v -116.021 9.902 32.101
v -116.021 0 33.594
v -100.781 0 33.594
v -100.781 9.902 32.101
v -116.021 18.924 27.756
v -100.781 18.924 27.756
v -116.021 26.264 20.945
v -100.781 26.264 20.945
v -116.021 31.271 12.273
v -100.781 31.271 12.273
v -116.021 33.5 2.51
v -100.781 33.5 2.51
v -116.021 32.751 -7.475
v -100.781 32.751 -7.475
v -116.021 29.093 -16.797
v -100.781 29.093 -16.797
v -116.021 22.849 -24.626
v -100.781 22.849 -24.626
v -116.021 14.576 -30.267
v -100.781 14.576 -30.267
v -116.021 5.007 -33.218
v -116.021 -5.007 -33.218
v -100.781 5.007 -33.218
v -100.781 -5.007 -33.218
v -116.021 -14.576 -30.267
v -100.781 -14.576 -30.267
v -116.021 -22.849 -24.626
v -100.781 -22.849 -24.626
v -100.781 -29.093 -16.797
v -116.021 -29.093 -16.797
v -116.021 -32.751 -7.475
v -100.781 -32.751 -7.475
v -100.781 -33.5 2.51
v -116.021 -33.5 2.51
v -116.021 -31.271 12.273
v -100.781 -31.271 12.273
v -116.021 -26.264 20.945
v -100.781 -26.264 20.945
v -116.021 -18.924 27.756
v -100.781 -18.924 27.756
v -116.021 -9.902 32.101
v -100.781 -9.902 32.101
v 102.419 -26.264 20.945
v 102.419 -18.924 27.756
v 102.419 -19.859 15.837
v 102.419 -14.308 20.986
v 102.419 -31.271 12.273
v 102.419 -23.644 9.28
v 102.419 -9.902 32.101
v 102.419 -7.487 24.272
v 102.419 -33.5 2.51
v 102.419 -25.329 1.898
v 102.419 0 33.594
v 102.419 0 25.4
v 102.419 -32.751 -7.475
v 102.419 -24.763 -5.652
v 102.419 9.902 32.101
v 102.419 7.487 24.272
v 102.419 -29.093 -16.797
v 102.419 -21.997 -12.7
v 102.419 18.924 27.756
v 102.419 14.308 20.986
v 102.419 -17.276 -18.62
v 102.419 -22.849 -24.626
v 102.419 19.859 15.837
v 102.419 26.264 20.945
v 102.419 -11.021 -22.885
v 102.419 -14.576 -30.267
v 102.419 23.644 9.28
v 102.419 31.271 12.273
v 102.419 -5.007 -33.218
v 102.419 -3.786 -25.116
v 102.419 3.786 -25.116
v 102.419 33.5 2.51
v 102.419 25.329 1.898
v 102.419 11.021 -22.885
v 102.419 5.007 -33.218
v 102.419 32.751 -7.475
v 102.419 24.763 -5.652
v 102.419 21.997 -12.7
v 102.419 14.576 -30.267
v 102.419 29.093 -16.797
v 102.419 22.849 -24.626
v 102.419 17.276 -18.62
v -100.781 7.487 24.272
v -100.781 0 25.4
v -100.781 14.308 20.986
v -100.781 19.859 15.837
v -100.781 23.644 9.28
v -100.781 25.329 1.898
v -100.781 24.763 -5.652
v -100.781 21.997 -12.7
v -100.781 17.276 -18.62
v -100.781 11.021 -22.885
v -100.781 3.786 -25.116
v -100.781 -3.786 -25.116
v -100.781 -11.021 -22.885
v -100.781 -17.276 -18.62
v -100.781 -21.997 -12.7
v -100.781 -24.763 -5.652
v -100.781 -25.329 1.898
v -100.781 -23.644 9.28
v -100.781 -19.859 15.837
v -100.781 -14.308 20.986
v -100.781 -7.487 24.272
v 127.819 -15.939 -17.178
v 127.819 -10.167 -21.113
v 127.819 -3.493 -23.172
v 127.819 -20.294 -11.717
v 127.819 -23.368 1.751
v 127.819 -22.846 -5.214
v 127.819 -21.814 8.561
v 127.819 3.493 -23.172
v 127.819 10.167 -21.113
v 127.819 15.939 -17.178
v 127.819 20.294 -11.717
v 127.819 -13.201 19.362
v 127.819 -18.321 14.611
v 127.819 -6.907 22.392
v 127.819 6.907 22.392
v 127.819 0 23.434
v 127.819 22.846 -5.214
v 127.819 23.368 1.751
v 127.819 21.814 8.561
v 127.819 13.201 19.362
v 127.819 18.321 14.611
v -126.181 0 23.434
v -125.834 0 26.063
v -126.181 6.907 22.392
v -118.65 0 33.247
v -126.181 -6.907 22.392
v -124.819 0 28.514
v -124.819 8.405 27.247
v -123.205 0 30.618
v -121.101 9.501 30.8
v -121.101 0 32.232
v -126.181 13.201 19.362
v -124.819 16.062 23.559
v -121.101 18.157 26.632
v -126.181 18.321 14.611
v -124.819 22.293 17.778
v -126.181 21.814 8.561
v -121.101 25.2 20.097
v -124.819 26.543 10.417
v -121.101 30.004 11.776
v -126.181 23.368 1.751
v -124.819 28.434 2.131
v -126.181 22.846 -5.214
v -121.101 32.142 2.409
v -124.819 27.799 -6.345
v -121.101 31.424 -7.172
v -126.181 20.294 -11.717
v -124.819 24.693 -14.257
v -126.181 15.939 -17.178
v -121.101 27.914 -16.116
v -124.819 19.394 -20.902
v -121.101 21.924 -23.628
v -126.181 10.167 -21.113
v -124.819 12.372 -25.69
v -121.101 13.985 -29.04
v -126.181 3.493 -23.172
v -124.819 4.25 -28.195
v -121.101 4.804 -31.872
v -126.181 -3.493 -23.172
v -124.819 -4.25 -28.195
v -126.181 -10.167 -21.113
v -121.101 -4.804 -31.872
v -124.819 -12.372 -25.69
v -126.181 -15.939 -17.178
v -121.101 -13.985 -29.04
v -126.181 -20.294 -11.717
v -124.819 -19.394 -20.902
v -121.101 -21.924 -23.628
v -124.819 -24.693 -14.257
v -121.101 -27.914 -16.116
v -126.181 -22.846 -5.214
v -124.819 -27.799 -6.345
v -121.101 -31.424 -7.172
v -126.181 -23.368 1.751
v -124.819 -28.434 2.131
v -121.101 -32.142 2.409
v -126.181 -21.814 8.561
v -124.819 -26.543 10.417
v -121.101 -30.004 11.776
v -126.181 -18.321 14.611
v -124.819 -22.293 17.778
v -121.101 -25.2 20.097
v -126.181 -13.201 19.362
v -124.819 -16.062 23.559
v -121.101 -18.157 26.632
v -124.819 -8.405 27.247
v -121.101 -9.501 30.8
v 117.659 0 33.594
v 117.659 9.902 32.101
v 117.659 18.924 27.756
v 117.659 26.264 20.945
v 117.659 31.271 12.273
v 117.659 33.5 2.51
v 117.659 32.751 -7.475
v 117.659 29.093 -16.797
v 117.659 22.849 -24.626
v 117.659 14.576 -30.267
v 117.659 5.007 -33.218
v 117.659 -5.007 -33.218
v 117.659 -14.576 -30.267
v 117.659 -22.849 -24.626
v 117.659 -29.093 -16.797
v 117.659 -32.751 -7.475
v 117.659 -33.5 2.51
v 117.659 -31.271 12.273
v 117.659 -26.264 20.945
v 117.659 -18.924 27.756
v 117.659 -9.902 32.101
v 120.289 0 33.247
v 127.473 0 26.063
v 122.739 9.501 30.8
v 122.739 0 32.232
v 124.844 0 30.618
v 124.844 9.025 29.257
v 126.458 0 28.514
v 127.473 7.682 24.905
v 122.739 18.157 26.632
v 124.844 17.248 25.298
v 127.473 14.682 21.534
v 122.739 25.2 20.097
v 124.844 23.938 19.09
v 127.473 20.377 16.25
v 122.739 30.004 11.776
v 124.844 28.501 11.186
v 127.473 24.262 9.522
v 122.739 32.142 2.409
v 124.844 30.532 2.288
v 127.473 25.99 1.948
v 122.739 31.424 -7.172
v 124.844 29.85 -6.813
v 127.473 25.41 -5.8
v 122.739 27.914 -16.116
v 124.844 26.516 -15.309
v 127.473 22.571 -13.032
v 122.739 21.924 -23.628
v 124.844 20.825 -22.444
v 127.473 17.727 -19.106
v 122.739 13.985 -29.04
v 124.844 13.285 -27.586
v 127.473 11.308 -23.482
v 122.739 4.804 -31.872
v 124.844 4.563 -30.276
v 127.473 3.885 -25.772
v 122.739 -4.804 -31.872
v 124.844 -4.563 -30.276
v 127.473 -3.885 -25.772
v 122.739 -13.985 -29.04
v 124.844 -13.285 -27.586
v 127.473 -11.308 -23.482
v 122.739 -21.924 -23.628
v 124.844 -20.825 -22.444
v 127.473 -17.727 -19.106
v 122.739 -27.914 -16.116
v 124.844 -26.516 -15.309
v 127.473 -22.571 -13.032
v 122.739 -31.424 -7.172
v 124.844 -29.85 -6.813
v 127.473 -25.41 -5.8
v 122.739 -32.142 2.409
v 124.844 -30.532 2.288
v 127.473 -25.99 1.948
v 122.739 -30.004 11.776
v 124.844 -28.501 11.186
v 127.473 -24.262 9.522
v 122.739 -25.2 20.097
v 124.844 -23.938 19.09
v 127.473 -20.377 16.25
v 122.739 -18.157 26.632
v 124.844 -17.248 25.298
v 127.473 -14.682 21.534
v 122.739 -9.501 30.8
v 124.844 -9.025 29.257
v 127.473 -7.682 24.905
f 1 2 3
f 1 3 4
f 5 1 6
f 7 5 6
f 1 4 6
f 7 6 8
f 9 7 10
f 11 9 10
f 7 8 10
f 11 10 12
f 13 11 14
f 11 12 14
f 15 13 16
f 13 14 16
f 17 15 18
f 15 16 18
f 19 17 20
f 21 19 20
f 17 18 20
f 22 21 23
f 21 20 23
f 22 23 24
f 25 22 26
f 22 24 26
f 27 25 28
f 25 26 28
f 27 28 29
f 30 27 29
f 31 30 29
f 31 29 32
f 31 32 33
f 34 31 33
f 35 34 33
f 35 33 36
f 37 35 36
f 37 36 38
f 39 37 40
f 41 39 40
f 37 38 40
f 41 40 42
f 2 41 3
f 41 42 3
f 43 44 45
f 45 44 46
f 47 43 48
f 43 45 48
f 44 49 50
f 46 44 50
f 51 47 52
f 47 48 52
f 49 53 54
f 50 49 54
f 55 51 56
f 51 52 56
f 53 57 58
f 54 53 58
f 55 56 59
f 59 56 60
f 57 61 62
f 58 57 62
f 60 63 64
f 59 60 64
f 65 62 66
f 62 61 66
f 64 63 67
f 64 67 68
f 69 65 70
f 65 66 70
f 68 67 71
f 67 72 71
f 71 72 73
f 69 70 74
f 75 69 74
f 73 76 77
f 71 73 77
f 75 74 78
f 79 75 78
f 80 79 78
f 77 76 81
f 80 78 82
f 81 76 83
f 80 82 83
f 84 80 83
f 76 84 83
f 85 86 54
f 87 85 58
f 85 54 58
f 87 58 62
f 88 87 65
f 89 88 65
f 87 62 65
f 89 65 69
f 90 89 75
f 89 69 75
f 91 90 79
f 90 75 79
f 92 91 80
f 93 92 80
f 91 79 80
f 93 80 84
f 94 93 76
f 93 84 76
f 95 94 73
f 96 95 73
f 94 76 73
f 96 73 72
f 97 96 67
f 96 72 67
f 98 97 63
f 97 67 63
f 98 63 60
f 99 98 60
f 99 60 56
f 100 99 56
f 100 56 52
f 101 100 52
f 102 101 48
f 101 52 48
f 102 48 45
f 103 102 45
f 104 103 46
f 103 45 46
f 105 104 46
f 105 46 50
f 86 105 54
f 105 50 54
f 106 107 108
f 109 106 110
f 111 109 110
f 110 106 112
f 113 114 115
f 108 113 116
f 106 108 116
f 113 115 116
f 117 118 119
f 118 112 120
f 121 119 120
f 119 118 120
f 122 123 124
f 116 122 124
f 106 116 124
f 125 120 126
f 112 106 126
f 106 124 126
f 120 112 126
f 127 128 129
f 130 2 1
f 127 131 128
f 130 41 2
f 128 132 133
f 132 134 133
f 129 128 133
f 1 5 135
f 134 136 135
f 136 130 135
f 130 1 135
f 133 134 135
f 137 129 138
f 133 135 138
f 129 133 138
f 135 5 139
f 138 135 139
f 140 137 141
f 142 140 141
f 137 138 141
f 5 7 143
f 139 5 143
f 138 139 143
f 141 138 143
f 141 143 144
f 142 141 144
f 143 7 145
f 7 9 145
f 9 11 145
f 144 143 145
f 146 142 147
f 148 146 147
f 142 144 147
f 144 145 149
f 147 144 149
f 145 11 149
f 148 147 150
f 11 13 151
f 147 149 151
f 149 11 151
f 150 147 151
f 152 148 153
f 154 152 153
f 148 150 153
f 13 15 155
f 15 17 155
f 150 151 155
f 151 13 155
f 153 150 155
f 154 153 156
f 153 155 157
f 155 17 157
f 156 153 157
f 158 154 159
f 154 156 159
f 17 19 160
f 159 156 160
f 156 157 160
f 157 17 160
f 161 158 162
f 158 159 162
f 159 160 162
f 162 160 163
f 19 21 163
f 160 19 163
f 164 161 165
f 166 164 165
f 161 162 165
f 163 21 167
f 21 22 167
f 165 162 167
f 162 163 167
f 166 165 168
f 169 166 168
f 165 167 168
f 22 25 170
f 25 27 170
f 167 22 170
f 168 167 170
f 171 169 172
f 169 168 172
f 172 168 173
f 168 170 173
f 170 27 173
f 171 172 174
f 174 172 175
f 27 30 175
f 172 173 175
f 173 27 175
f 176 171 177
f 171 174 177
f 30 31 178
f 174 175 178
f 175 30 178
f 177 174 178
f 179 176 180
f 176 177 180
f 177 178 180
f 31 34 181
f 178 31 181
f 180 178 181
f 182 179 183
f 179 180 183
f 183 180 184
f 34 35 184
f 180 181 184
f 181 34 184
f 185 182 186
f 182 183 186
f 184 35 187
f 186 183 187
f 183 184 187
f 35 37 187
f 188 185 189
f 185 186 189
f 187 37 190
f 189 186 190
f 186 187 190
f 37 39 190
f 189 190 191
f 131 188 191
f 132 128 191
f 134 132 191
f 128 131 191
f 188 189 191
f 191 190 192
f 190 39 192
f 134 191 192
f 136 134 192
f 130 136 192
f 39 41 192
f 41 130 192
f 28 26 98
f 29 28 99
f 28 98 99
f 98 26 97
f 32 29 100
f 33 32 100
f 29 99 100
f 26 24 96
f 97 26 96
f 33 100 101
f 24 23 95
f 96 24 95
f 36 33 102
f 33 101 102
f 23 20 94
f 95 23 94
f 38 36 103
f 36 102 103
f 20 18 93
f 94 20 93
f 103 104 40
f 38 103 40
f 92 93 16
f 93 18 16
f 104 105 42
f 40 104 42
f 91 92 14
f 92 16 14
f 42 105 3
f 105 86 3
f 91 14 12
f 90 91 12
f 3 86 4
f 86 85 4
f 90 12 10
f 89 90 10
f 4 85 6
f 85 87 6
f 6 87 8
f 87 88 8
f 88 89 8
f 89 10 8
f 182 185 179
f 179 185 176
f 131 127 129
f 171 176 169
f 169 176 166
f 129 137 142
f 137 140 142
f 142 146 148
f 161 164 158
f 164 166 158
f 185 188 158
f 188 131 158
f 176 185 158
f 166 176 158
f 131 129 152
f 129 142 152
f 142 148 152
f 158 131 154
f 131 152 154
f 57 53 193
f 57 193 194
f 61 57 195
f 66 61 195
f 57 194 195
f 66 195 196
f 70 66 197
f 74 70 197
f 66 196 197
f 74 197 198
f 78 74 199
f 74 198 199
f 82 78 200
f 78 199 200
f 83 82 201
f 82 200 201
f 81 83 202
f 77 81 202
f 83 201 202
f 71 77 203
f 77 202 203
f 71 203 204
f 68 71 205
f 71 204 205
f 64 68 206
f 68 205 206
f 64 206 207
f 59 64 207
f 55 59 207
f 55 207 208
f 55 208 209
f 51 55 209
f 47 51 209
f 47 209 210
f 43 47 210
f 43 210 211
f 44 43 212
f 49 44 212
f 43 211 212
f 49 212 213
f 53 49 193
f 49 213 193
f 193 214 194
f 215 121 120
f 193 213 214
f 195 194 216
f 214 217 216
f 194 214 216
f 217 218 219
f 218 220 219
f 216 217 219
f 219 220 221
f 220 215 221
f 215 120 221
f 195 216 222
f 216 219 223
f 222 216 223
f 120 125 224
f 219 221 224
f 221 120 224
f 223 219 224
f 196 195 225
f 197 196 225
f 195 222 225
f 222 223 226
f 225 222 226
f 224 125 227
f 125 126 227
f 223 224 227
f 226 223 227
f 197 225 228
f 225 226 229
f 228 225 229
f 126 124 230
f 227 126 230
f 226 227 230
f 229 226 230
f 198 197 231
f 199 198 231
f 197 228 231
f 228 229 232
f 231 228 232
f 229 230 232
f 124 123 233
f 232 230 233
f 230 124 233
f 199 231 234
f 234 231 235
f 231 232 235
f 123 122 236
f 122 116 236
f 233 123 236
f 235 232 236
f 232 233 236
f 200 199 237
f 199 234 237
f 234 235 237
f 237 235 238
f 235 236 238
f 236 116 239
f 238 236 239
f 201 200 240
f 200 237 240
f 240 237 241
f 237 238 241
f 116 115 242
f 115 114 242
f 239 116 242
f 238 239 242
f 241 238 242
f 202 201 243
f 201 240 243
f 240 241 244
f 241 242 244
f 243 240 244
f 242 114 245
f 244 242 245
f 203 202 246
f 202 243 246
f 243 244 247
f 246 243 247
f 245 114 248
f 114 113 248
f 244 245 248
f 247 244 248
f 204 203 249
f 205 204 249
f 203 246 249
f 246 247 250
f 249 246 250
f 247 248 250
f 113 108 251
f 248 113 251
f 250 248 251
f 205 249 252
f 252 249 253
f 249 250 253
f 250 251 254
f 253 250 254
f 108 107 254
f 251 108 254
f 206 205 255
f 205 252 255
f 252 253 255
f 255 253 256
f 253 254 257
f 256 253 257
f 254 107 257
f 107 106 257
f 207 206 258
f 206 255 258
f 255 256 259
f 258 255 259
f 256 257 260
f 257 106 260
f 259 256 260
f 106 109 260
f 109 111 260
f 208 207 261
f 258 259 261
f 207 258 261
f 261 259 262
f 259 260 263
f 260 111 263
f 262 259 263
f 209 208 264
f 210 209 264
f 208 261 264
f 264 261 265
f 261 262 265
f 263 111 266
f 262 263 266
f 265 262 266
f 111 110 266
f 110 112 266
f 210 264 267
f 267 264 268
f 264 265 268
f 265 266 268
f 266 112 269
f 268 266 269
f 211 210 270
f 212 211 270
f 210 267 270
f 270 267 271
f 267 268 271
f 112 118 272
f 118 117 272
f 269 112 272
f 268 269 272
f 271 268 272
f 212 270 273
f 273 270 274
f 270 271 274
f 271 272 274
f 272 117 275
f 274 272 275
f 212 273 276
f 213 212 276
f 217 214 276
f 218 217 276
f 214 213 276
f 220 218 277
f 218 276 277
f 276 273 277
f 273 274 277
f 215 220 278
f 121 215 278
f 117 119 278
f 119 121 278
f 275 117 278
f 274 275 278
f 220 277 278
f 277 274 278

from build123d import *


with BuildPart() as part:
    # Sketch1 → Revolve1 (revolve)
    with BuildSketch(Plane(origin=(0, 0, 0), x_dir=(1, 0, 0), z_dir=(0, 1, 0))):
        with BuildLine():
            Line((-100.780645161, -25.4), (102.419354839, -25.4))
            Line((102.419354839, -25.4), (102.419354839, -33.593548387))
            Line((102.419354839, -33.593548387), (117.659354839, -33.593548387))
            ThreePointArc((117.659354839, -33.593548387), (124.843559736, -30.617753284), (127.819354839, -23.433548387))
            Line((127.819354839, -23.433548387), (127.819354839, 0))
            Line((127.819354839, 0), (-126.180645161, 0))
            Line((-126.180645161, 0), (-126.180645161, -23.433548387))
            ThreePointArc((-126.180645161, -23.433548387), (-123.204850058, -30.617753284), (-116.020645161, -33.593548387))
            Line((-116.020645161, -33.593548387), (-100.780645161, -33.593548387))
            Line((-100.780645161, -33.593548387), (-100.780645161, -25.4))
        make_face()
    revolve(axis=Axis((127.819354839, 0, 0), (-1, 0, 0)))


solid = part.part
